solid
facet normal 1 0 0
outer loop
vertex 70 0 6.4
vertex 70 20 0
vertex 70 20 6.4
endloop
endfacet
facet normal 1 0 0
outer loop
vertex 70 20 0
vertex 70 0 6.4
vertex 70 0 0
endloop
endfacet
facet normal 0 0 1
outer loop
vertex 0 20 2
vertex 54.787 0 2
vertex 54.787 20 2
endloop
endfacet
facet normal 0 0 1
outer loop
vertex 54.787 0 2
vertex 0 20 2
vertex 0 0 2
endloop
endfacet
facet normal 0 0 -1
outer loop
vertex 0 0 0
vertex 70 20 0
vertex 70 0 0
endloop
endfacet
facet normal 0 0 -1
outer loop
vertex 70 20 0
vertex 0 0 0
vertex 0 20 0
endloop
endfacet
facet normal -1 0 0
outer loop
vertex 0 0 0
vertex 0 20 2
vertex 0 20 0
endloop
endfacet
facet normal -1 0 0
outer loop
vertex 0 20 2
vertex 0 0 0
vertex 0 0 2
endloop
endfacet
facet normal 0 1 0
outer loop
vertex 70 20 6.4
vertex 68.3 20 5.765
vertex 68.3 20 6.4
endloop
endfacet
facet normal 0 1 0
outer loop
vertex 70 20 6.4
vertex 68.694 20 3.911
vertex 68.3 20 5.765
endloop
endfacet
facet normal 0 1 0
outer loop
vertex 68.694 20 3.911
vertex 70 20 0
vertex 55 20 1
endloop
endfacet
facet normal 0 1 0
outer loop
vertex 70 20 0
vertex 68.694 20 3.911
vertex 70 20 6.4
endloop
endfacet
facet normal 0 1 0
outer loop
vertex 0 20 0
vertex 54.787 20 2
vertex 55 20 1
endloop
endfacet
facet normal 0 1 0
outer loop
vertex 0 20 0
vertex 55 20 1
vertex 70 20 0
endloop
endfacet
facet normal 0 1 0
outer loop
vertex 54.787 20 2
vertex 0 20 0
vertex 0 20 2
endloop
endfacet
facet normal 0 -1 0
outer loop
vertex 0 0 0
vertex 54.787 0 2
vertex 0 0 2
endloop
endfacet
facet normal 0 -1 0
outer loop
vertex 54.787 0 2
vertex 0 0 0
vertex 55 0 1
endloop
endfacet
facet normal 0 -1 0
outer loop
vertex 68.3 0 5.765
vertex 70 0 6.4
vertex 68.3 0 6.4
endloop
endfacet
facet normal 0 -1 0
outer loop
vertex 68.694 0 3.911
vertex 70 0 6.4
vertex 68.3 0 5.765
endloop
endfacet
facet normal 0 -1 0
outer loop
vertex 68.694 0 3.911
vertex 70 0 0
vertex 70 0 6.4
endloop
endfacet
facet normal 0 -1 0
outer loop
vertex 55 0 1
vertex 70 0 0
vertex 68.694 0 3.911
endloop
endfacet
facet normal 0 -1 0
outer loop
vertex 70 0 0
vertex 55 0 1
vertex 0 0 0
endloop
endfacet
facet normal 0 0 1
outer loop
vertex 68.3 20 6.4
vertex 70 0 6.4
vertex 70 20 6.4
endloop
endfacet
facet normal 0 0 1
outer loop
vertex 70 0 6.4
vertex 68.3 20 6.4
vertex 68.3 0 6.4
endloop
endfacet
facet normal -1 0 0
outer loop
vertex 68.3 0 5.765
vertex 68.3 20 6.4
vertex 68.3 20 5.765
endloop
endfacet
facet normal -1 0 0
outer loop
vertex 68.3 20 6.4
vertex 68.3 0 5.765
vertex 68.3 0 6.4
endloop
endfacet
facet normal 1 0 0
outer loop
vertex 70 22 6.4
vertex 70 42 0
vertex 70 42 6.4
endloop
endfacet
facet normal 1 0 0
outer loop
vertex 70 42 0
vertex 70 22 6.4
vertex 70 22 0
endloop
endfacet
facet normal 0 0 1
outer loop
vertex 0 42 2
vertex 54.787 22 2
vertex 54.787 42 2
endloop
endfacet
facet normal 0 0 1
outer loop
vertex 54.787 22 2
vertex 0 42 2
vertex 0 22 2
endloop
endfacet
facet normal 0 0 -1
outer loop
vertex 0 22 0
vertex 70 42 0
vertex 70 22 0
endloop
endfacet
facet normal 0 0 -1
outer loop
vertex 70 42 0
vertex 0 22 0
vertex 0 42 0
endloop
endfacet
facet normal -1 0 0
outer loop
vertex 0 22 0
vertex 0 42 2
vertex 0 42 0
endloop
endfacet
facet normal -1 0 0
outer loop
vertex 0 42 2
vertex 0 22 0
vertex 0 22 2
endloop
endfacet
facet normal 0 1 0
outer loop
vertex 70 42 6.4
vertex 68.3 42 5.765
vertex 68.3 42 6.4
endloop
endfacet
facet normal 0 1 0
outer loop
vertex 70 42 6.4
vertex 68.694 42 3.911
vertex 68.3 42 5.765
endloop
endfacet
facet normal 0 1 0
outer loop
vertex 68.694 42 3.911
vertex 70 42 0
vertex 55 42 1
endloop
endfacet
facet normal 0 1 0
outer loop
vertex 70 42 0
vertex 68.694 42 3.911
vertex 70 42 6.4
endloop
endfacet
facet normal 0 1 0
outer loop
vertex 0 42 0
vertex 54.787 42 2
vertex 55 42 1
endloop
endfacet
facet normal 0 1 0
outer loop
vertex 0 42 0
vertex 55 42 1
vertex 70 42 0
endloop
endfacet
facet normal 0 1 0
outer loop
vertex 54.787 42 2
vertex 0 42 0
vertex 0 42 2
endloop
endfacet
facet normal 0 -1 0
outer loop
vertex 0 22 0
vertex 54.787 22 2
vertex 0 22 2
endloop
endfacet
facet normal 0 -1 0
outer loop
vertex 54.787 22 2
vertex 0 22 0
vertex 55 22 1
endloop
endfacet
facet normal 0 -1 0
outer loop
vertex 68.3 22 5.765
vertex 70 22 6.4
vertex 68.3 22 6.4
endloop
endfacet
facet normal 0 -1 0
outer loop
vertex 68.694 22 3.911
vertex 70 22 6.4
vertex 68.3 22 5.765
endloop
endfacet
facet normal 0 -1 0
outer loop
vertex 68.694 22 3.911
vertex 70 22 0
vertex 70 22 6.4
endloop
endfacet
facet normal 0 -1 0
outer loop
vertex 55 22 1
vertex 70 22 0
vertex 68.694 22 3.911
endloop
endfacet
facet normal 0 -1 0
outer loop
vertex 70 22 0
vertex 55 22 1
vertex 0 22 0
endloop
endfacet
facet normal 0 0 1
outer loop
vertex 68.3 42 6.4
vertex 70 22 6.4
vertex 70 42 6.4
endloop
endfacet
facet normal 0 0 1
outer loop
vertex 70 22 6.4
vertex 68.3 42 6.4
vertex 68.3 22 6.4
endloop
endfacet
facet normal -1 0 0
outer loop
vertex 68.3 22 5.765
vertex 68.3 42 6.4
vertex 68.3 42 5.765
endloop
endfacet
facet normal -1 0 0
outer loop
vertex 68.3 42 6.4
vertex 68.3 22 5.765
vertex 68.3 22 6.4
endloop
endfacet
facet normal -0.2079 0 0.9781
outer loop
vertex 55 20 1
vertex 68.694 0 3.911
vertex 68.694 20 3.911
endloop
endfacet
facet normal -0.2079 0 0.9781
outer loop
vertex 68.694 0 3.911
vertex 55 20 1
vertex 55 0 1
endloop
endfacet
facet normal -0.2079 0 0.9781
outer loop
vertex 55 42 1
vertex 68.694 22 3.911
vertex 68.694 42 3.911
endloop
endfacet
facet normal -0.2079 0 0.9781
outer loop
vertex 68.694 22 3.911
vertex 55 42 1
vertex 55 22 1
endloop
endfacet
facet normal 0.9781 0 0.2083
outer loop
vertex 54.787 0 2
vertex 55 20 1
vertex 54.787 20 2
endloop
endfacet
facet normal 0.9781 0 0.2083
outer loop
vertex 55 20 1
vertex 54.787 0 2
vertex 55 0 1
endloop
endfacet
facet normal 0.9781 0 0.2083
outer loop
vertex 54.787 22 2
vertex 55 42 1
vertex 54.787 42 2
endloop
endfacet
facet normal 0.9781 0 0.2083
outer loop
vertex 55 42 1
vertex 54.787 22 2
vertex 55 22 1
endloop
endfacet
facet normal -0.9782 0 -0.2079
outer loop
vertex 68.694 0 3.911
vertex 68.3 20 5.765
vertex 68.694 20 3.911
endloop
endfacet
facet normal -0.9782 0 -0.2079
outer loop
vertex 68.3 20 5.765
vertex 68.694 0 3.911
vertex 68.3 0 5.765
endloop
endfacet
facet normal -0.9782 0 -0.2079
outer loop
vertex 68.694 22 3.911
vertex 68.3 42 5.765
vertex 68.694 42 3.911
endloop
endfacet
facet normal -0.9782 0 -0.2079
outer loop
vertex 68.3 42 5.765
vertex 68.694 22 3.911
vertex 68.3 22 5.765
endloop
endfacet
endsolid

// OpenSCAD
bH = 2;
bD = 70;
sW = 180;
sH = 180;
sD = 3;
sE = 15;
A = -12;

module vent(vD,vW,vH) {
    cube([vH,vW,vD]);
}

module grate(oW,oH,oD,cnt) {
    for (i = [1:cnt]) {
        translate([16,i*28-17,-.5]) vent(oD,oW,oH);
    }
}
module base() {
    bW = 20;
    cube([bD,bW,bH]);
    translate([bD-sE+4.7,0,bH]) cube([sE-4.7,bW,bH]);
    translate([bD-sE+13.3,0,bH+bH]) cube([sE-13.3,bW,bH+.4]);
}
module bases() {
    base();
    translate([0,22,0]) base();
}
module stand() {
    cube([bH,sW,sH]);
    cube([sE-1,sW,bH]);
}
module stando() {
    cube([sH,sW,bH]);
    cube([bH,sW,sE-1]);
}
module carves() {
}
module carveb() {
    difference() {
        bases();
        translate([bD-sE,-1,bH-1]) rotate([0,A,0]) stand();
    }
}

module fulls() {
    base();
    translate([bD-sE,0,bH-1]) rotate([0,A,0]) stand();
}

//stand();
carveb();
//fulls();
//stando();
//difference() {
//    stando();
//    grate(18,148,4,6);
//}
